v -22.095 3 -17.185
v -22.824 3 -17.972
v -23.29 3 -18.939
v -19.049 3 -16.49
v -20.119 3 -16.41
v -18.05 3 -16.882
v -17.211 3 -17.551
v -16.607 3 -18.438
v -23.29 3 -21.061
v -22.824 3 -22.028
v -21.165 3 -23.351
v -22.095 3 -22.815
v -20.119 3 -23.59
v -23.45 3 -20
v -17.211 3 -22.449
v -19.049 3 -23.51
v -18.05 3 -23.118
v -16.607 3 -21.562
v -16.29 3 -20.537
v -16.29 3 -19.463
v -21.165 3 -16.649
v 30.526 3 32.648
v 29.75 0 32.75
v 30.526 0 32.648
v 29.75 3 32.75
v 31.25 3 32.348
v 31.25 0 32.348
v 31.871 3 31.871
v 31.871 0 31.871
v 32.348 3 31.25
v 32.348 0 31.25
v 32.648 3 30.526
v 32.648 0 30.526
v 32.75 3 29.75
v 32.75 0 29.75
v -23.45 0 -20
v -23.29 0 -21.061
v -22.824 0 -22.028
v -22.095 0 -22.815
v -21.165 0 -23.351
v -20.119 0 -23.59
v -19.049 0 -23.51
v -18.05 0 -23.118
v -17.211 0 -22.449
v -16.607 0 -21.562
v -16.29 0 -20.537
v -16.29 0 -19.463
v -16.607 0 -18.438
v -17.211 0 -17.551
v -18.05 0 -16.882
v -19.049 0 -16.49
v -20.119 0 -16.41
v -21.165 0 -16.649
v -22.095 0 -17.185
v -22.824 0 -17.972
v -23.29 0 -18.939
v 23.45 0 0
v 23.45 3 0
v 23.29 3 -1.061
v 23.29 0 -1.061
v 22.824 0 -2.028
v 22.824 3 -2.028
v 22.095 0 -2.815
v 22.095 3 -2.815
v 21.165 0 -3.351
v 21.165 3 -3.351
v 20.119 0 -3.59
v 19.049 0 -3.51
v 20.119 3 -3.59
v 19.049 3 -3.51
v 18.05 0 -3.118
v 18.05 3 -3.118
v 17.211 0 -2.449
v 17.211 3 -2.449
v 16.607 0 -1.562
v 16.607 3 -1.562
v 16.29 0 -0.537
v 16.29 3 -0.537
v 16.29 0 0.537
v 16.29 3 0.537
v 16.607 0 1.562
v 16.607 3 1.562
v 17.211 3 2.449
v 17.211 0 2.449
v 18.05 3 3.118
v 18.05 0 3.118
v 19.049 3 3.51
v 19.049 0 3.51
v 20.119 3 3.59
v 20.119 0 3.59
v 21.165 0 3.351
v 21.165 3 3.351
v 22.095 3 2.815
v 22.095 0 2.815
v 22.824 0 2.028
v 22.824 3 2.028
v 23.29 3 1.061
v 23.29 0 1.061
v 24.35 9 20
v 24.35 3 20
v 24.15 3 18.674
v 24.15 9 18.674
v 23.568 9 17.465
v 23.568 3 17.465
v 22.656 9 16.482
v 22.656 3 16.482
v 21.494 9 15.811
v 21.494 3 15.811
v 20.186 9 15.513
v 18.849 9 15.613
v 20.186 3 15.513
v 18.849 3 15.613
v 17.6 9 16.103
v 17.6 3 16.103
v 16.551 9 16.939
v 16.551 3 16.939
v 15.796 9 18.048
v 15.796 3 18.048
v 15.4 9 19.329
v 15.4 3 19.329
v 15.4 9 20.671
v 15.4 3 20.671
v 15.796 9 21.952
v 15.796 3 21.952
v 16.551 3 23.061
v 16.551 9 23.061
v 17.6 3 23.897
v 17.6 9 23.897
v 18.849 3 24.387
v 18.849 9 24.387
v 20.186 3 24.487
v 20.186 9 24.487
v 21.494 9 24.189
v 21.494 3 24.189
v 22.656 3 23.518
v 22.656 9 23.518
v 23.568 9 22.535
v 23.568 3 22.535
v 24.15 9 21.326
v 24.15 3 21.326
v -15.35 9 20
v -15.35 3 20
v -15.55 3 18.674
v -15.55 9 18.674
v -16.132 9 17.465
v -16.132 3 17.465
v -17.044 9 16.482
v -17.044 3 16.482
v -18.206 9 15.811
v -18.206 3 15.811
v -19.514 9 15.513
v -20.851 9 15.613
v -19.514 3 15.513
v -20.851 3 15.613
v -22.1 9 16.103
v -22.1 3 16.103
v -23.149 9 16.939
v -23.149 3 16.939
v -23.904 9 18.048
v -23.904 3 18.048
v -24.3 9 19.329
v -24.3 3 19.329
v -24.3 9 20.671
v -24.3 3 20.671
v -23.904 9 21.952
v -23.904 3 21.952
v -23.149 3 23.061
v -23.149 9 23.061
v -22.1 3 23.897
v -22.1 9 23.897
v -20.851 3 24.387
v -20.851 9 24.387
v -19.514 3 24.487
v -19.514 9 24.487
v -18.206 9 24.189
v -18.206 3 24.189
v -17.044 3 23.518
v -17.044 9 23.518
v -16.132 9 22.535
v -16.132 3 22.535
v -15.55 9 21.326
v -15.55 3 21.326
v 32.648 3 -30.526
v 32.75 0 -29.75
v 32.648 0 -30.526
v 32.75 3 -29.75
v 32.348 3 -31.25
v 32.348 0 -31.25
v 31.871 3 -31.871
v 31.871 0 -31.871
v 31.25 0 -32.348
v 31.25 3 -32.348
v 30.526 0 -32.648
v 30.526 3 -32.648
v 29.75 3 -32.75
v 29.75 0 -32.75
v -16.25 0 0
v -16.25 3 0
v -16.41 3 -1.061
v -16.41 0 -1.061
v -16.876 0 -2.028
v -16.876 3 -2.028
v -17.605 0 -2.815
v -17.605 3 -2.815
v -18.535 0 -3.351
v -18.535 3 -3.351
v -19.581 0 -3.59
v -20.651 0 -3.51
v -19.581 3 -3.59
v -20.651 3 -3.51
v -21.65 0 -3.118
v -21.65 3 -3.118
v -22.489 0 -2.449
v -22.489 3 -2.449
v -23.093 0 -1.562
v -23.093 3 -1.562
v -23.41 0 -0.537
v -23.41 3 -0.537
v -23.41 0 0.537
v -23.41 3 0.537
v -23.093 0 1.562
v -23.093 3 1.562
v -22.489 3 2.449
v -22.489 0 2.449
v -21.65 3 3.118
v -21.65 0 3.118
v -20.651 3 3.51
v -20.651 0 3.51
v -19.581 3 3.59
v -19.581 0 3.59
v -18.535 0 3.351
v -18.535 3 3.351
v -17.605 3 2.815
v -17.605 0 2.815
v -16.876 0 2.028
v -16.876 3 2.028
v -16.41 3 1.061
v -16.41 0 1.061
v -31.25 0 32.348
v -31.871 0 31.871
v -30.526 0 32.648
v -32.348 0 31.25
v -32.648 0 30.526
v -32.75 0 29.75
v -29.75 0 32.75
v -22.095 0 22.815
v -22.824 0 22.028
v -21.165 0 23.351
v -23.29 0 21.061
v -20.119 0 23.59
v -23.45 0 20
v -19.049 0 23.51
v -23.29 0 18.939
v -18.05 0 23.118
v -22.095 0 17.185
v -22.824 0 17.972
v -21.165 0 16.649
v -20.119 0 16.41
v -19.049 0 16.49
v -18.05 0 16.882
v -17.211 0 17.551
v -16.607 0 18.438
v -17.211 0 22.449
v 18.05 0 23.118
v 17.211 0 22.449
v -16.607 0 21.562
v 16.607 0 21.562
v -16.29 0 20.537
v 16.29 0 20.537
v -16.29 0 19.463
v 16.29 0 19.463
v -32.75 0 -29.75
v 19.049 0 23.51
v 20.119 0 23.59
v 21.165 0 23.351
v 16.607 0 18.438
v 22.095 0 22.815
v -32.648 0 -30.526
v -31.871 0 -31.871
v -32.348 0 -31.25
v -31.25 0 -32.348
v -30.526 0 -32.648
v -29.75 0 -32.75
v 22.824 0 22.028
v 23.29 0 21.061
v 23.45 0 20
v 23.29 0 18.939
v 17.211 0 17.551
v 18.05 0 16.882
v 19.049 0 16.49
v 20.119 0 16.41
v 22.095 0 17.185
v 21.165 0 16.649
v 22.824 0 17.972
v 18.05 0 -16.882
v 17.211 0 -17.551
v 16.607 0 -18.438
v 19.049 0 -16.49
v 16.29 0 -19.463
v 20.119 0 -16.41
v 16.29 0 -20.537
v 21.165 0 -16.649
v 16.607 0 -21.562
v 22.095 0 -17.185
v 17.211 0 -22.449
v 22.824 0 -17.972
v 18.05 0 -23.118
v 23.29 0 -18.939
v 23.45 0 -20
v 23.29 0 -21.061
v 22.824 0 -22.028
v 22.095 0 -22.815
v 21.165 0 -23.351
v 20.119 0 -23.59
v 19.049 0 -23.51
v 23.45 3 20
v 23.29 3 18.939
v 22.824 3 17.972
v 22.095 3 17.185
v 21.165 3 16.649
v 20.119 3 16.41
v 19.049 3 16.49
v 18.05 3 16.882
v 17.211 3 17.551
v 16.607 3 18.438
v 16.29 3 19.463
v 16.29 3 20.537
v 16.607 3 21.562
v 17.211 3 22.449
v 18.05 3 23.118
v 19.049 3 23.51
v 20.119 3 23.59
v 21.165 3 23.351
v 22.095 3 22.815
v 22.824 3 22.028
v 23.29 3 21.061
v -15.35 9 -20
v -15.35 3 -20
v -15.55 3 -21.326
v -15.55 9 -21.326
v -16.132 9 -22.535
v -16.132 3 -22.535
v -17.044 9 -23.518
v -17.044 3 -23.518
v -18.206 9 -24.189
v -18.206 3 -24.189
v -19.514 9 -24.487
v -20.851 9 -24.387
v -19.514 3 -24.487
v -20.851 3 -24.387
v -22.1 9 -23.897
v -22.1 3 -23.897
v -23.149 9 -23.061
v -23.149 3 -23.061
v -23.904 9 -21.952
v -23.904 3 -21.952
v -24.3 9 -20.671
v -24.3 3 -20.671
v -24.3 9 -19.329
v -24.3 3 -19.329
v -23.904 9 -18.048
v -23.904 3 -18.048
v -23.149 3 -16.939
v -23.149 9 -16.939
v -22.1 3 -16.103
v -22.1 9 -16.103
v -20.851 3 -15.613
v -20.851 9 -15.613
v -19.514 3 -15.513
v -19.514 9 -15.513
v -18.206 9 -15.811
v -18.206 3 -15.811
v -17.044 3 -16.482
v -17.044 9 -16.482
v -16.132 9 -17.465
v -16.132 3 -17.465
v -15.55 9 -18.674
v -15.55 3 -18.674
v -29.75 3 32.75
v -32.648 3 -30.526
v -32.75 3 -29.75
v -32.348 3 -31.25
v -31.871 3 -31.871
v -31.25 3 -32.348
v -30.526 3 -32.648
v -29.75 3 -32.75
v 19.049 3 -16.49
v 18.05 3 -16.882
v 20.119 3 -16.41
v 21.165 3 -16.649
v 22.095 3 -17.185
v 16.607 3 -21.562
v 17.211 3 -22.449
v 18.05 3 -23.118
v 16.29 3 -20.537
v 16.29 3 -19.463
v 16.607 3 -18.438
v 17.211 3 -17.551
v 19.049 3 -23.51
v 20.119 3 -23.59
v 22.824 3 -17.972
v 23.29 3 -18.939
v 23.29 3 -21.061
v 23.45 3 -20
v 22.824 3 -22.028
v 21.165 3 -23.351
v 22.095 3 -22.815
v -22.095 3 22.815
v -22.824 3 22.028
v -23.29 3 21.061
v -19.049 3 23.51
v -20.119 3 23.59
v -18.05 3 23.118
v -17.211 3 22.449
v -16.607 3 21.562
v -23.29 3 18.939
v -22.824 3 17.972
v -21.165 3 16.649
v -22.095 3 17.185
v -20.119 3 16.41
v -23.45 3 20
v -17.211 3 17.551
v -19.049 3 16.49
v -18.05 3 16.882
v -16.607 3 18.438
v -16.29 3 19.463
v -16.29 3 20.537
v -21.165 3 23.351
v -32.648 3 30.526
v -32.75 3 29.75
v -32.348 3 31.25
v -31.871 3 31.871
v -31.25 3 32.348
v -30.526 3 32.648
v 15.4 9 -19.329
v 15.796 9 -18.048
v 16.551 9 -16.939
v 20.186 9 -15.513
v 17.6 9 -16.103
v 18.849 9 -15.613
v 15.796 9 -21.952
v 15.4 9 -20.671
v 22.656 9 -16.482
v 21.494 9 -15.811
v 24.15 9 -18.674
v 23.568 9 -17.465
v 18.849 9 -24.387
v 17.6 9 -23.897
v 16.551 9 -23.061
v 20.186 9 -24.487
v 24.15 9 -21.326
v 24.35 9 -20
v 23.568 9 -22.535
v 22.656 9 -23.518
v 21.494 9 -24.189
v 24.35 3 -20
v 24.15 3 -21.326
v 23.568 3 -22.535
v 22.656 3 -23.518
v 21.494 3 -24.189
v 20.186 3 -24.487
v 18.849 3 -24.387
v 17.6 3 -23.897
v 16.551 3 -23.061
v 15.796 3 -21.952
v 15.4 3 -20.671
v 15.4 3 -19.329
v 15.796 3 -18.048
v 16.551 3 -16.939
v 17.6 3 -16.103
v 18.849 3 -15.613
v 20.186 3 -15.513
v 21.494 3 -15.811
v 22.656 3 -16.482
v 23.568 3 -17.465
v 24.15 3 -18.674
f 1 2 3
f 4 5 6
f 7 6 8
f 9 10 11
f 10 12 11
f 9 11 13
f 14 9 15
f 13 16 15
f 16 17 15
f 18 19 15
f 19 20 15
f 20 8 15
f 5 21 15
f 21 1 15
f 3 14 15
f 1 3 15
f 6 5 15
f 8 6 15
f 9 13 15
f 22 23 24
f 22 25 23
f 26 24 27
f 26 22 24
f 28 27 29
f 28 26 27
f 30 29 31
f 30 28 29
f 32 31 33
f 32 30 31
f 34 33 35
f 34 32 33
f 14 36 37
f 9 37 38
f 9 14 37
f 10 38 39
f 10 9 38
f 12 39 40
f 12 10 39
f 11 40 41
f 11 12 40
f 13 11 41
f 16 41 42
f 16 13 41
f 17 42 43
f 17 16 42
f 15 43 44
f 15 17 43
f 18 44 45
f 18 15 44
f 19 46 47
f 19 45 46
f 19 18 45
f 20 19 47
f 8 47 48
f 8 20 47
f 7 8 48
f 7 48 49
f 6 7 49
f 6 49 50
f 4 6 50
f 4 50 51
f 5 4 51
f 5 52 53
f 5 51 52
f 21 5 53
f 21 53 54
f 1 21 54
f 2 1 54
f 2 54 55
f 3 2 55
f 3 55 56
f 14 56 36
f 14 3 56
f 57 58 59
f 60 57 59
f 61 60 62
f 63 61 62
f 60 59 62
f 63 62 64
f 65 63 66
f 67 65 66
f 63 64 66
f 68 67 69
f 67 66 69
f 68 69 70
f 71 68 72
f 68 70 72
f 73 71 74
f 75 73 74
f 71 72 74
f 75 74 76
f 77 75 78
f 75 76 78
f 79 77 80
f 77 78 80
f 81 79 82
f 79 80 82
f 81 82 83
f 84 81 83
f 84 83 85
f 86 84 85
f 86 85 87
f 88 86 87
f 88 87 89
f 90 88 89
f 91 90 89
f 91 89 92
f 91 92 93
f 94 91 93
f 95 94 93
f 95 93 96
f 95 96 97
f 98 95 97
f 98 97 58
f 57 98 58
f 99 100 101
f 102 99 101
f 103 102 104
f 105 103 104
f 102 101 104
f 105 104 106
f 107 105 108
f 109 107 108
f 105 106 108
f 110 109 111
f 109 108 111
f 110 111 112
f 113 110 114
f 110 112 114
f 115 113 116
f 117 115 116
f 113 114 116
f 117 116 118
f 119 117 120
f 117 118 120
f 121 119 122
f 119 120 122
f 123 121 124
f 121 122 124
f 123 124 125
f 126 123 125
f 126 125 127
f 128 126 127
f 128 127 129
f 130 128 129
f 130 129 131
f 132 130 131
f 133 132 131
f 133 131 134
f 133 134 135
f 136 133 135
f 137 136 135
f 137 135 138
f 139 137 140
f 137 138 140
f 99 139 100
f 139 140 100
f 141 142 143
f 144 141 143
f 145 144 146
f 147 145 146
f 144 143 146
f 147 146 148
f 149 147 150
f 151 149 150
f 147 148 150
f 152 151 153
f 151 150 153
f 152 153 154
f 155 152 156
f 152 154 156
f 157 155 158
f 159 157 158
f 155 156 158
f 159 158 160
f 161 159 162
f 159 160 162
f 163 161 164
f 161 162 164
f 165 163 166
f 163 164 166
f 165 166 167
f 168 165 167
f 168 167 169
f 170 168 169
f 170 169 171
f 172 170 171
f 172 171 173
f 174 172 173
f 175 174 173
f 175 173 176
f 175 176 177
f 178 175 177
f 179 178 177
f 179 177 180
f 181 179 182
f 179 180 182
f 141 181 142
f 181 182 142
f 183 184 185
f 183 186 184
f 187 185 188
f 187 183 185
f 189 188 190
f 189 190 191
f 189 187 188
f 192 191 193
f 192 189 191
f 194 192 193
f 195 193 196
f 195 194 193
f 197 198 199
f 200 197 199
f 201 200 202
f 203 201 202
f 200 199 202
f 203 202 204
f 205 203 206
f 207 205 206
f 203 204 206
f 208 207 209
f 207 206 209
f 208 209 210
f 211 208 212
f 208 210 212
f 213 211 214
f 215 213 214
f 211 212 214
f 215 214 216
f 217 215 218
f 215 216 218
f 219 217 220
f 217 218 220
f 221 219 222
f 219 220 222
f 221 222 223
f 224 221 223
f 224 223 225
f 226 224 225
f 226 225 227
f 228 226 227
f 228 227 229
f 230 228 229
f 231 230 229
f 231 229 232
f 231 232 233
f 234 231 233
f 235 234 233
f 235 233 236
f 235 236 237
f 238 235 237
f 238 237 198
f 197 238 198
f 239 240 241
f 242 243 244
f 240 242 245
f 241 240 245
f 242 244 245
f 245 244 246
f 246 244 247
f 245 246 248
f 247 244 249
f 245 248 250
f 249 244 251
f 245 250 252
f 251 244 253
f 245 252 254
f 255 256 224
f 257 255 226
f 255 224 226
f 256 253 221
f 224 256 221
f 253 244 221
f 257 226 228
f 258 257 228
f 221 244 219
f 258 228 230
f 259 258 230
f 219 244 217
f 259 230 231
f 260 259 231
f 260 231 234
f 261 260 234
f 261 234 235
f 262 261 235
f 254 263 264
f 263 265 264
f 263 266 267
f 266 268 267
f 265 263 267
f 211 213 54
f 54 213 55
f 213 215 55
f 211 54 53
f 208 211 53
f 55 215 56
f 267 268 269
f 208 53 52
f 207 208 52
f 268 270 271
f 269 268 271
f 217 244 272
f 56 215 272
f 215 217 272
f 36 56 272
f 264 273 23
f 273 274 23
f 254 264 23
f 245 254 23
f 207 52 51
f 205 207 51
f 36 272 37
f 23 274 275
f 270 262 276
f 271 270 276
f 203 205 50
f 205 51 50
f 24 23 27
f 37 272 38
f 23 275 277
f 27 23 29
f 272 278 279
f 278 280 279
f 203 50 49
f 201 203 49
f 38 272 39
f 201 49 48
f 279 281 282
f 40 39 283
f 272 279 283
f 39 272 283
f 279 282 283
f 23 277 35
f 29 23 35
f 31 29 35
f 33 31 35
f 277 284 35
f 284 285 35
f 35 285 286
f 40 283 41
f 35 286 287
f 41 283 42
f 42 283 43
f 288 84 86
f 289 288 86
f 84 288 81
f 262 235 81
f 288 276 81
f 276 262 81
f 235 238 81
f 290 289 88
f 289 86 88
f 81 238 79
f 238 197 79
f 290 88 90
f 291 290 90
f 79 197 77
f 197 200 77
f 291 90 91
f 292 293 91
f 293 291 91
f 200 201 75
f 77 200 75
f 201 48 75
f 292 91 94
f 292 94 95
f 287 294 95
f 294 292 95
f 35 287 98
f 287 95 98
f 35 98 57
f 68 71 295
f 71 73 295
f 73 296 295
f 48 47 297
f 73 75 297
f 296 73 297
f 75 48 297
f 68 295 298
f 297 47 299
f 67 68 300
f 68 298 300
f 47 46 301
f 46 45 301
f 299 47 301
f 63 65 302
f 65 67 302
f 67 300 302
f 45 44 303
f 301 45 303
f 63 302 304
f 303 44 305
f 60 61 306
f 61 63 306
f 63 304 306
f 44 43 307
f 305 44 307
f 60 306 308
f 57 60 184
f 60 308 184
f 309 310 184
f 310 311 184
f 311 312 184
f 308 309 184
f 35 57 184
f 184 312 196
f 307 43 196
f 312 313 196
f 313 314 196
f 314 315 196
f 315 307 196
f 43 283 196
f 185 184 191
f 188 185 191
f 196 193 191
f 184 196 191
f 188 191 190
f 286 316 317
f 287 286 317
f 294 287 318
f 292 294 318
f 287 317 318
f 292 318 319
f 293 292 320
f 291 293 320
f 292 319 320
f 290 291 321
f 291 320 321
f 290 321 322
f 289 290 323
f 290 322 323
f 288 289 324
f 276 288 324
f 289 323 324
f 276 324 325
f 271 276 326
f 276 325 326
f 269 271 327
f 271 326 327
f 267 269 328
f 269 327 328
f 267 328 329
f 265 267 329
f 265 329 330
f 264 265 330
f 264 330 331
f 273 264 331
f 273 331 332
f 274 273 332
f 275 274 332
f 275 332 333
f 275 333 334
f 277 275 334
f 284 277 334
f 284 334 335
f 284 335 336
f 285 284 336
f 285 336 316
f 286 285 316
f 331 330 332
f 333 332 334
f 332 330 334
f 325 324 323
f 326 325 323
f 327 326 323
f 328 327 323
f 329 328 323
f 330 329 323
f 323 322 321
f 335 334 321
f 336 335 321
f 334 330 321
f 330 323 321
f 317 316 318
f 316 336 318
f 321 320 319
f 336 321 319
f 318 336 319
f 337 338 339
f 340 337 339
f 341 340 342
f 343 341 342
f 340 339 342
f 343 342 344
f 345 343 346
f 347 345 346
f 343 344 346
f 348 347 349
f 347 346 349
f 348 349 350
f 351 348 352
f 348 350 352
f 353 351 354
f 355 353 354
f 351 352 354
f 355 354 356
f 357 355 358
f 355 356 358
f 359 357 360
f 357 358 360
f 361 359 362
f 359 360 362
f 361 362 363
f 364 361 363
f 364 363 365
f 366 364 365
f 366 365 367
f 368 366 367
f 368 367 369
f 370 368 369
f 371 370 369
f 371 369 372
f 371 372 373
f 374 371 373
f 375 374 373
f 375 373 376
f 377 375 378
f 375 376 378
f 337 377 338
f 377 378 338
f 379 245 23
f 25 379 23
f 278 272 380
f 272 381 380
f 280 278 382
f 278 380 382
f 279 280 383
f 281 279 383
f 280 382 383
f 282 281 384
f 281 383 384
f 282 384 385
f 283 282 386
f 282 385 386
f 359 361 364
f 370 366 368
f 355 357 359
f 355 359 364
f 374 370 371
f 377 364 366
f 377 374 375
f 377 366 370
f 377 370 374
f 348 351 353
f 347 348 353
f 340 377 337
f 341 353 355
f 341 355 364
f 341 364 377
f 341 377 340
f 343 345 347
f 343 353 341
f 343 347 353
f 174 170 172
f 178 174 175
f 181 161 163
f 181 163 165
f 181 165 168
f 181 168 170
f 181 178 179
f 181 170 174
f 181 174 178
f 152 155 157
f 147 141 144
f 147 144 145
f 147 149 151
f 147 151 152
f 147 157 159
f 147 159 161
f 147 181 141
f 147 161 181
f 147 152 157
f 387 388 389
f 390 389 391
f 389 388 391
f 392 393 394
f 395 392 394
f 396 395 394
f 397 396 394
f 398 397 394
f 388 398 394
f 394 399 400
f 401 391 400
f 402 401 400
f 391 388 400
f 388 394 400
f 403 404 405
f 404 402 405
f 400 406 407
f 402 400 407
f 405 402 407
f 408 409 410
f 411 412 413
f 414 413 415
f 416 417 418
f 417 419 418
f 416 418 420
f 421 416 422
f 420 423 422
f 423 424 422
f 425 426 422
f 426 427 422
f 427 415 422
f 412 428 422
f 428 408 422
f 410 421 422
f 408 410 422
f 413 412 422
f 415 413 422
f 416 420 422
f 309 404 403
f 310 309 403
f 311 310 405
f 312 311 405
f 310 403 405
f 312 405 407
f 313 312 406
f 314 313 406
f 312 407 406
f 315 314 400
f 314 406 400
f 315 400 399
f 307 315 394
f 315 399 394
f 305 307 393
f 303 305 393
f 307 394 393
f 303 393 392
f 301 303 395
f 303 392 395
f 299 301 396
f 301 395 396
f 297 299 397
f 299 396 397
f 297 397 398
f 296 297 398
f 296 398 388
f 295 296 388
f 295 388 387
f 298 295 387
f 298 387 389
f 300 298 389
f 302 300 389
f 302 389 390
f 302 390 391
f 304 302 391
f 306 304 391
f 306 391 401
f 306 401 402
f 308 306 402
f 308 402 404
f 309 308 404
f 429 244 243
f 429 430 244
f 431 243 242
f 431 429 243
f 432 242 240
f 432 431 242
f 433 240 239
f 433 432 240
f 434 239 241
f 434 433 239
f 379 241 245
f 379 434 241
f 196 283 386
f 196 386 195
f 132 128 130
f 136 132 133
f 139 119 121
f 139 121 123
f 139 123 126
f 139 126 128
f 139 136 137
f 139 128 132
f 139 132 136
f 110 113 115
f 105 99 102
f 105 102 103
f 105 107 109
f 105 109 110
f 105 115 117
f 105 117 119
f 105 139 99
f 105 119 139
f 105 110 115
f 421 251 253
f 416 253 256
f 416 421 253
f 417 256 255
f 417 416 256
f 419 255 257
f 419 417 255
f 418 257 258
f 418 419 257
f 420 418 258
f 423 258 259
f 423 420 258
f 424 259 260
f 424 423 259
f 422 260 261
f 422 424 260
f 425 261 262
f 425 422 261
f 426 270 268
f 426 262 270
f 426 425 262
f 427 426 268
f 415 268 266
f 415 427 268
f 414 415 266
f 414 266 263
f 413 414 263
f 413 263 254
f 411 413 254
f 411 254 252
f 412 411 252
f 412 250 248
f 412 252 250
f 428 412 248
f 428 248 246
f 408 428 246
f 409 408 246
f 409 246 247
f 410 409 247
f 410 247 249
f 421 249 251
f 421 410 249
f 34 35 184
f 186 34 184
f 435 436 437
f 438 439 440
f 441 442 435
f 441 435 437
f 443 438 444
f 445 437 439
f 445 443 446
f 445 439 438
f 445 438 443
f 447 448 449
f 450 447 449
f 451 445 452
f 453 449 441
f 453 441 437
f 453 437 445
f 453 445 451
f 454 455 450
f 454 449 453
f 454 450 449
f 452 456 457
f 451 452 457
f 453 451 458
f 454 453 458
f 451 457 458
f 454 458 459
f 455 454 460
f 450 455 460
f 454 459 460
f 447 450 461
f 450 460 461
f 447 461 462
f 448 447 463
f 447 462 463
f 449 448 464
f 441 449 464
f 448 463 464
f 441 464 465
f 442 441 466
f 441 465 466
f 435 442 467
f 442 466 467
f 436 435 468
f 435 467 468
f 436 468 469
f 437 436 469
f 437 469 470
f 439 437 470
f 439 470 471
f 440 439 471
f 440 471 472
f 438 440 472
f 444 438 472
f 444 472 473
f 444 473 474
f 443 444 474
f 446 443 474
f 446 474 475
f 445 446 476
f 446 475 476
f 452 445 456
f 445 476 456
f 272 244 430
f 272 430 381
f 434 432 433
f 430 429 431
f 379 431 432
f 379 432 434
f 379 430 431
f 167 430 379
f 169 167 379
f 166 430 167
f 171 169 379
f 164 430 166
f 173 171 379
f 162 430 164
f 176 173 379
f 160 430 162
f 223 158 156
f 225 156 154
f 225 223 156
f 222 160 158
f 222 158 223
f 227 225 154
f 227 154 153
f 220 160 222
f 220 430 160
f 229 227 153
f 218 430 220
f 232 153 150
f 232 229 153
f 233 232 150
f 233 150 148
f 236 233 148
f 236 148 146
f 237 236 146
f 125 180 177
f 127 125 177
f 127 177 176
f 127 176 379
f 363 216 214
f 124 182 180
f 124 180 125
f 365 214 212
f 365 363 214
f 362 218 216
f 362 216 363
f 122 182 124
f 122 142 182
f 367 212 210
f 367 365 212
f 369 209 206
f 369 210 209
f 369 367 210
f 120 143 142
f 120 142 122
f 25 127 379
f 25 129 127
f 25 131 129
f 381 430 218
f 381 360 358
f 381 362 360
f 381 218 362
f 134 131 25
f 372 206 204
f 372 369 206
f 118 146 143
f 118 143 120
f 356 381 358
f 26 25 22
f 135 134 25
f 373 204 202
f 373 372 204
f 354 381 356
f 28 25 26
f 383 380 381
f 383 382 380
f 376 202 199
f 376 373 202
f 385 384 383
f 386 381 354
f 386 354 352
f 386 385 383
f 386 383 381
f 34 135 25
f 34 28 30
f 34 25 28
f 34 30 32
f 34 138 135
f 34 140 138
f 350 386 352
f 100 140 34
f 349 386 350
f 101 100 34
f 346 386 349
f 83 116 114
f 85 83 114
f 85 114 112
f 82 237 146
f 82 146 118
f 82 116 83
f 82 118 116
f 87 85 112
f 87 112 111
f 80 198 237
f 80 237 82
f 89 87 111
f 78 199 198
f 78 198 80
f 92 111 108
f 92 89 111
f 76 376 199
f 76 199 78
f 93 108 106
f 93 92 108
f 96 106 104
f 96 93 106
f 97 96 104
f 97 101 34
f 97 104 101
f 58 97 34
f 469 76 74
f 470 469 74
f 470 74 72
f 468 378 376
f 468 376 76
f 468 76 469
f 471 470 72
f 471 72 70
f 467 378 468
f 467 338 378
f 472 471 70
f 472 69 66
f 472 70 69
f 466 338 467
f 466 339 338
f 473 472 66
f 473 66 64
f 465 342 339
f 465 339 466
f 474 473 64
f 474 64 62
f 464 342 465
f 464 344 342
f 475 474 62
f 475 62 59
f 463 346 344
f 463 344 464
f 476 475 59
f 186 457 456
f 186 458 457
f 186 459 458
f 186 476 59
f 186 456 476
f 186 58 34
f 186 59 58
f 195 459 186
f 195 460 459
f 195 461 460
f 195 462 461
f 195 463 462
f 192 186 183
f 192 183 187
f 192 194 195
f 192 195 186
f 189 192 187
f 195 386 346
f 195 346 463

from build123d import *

# Parameters (mm, degrees)
SKETCH1_W               = 65.5
SKETCH1_H               = 65.5
BOSS_EXTRUDE1_DEPTH     = 3
FILLET1_R               = 3
SKETCH2_R               = 3.6
CUT_EXTRUDE1_DEPTH      = 23
SKETCH3_R               = 4.5
BOSS_EXTRUDE2_DEPTH     = 6
SKETCH4_R               = 3.6
CUT_EXTRUDE2_DEPTH      = 7
CUT_EXTRUDE2_DEPTH_BACK = 4


with BuildPart() as part:
    # Sketch1 → Boss-Extrude1 (new body)
    with BuildSketch(Plane(origin=(0, 0, 0), x_dir=(1, 0, 0), z_dir=(0, 1, 0))):
        Rectangle(SKETCH1_W, SKETCH1_H)
    extrude(amount=BOSS_EXTRUDE1_DEPTH)

    # Fillet1
    fillet1_edges = [part.edges().sort_by_distance(p)[0] for p in [
        (-32.75, 1.5, -32.75),
        (32.75, 1.5, -32.75),
        (32.75, 1.5, 32.75),
        (-32.75, 1.5, 32.75),
    ]]
    fillet(fillet1_edges, radius=FILLET1_R)

    # Sketch2 → Cut-Extrude1 (cut)
    with BuildSketch(Plane(origin=(0, 3, 0), x_dir=(1, 0, 0), z_dir=(0, 1, 0))):
        with Locations((19.85, -20)):
            Circle(SKETCH2_R)
        with Locations((19.85, 20)):
            Circle(SKETCH2_R)
    cut_extrude1 = extrude(amount=-CUT_EXTRUDE1_DEPTH, mode=Mode.SUBTRACT)

    # Mirror1: Cut-Extrude1 across plane
    add(cut_extrude1.mirror(Plane(origin=(0, 0, 0), x_dir=(0, 0, 1), z_dir=(1, 0, 0))), mode=Mode.SUBTRACT)

    # Sketch3 → Boss-Extrude2 (add)
    with BuildSketch(Plane(origin=(0, 3, 0), x_dir=(1, 0, 0), z_dir=(0, 1, 0))):
        with Locations((19.85, -20)):
            Circle(SKETCH3_R)
        with Locations((19.85, 20)):
            Circle(SKETCH3_R)
        with Locations((-19.85, 20)):
            Circle(SKETCH3_R)
        with Locations((-19.85, -20)):
            Circle(SKETCH3_R)
    extrude(amount=BOSS_EXTRUDE2_DEPTH)

    # Sketch4 → Cut-Extrude2 (cut, two sides)
    with BuildSketch(Plane(origin=(0, 3, 0), x_dir=(1, 0, 0), z_dir=(0, 1, 0))) as cut_extrude2_sk:
        with Locations((19.85, 0)):
            Circle(SKETCH4_R)
        with Locations((-19.85, 0)):
            Circle(SKETCH4_R)
    extrude(amount=CUT_EXTRUDE2_DEPTH, mode=Mode.SUBTRACT)
    extrude(cut_extrude2_sk.sketch, amount=-CUT_EXTRUDE2_DEPTH_BACK, mode=Mode.SUBTRACT)


solid = part.part
